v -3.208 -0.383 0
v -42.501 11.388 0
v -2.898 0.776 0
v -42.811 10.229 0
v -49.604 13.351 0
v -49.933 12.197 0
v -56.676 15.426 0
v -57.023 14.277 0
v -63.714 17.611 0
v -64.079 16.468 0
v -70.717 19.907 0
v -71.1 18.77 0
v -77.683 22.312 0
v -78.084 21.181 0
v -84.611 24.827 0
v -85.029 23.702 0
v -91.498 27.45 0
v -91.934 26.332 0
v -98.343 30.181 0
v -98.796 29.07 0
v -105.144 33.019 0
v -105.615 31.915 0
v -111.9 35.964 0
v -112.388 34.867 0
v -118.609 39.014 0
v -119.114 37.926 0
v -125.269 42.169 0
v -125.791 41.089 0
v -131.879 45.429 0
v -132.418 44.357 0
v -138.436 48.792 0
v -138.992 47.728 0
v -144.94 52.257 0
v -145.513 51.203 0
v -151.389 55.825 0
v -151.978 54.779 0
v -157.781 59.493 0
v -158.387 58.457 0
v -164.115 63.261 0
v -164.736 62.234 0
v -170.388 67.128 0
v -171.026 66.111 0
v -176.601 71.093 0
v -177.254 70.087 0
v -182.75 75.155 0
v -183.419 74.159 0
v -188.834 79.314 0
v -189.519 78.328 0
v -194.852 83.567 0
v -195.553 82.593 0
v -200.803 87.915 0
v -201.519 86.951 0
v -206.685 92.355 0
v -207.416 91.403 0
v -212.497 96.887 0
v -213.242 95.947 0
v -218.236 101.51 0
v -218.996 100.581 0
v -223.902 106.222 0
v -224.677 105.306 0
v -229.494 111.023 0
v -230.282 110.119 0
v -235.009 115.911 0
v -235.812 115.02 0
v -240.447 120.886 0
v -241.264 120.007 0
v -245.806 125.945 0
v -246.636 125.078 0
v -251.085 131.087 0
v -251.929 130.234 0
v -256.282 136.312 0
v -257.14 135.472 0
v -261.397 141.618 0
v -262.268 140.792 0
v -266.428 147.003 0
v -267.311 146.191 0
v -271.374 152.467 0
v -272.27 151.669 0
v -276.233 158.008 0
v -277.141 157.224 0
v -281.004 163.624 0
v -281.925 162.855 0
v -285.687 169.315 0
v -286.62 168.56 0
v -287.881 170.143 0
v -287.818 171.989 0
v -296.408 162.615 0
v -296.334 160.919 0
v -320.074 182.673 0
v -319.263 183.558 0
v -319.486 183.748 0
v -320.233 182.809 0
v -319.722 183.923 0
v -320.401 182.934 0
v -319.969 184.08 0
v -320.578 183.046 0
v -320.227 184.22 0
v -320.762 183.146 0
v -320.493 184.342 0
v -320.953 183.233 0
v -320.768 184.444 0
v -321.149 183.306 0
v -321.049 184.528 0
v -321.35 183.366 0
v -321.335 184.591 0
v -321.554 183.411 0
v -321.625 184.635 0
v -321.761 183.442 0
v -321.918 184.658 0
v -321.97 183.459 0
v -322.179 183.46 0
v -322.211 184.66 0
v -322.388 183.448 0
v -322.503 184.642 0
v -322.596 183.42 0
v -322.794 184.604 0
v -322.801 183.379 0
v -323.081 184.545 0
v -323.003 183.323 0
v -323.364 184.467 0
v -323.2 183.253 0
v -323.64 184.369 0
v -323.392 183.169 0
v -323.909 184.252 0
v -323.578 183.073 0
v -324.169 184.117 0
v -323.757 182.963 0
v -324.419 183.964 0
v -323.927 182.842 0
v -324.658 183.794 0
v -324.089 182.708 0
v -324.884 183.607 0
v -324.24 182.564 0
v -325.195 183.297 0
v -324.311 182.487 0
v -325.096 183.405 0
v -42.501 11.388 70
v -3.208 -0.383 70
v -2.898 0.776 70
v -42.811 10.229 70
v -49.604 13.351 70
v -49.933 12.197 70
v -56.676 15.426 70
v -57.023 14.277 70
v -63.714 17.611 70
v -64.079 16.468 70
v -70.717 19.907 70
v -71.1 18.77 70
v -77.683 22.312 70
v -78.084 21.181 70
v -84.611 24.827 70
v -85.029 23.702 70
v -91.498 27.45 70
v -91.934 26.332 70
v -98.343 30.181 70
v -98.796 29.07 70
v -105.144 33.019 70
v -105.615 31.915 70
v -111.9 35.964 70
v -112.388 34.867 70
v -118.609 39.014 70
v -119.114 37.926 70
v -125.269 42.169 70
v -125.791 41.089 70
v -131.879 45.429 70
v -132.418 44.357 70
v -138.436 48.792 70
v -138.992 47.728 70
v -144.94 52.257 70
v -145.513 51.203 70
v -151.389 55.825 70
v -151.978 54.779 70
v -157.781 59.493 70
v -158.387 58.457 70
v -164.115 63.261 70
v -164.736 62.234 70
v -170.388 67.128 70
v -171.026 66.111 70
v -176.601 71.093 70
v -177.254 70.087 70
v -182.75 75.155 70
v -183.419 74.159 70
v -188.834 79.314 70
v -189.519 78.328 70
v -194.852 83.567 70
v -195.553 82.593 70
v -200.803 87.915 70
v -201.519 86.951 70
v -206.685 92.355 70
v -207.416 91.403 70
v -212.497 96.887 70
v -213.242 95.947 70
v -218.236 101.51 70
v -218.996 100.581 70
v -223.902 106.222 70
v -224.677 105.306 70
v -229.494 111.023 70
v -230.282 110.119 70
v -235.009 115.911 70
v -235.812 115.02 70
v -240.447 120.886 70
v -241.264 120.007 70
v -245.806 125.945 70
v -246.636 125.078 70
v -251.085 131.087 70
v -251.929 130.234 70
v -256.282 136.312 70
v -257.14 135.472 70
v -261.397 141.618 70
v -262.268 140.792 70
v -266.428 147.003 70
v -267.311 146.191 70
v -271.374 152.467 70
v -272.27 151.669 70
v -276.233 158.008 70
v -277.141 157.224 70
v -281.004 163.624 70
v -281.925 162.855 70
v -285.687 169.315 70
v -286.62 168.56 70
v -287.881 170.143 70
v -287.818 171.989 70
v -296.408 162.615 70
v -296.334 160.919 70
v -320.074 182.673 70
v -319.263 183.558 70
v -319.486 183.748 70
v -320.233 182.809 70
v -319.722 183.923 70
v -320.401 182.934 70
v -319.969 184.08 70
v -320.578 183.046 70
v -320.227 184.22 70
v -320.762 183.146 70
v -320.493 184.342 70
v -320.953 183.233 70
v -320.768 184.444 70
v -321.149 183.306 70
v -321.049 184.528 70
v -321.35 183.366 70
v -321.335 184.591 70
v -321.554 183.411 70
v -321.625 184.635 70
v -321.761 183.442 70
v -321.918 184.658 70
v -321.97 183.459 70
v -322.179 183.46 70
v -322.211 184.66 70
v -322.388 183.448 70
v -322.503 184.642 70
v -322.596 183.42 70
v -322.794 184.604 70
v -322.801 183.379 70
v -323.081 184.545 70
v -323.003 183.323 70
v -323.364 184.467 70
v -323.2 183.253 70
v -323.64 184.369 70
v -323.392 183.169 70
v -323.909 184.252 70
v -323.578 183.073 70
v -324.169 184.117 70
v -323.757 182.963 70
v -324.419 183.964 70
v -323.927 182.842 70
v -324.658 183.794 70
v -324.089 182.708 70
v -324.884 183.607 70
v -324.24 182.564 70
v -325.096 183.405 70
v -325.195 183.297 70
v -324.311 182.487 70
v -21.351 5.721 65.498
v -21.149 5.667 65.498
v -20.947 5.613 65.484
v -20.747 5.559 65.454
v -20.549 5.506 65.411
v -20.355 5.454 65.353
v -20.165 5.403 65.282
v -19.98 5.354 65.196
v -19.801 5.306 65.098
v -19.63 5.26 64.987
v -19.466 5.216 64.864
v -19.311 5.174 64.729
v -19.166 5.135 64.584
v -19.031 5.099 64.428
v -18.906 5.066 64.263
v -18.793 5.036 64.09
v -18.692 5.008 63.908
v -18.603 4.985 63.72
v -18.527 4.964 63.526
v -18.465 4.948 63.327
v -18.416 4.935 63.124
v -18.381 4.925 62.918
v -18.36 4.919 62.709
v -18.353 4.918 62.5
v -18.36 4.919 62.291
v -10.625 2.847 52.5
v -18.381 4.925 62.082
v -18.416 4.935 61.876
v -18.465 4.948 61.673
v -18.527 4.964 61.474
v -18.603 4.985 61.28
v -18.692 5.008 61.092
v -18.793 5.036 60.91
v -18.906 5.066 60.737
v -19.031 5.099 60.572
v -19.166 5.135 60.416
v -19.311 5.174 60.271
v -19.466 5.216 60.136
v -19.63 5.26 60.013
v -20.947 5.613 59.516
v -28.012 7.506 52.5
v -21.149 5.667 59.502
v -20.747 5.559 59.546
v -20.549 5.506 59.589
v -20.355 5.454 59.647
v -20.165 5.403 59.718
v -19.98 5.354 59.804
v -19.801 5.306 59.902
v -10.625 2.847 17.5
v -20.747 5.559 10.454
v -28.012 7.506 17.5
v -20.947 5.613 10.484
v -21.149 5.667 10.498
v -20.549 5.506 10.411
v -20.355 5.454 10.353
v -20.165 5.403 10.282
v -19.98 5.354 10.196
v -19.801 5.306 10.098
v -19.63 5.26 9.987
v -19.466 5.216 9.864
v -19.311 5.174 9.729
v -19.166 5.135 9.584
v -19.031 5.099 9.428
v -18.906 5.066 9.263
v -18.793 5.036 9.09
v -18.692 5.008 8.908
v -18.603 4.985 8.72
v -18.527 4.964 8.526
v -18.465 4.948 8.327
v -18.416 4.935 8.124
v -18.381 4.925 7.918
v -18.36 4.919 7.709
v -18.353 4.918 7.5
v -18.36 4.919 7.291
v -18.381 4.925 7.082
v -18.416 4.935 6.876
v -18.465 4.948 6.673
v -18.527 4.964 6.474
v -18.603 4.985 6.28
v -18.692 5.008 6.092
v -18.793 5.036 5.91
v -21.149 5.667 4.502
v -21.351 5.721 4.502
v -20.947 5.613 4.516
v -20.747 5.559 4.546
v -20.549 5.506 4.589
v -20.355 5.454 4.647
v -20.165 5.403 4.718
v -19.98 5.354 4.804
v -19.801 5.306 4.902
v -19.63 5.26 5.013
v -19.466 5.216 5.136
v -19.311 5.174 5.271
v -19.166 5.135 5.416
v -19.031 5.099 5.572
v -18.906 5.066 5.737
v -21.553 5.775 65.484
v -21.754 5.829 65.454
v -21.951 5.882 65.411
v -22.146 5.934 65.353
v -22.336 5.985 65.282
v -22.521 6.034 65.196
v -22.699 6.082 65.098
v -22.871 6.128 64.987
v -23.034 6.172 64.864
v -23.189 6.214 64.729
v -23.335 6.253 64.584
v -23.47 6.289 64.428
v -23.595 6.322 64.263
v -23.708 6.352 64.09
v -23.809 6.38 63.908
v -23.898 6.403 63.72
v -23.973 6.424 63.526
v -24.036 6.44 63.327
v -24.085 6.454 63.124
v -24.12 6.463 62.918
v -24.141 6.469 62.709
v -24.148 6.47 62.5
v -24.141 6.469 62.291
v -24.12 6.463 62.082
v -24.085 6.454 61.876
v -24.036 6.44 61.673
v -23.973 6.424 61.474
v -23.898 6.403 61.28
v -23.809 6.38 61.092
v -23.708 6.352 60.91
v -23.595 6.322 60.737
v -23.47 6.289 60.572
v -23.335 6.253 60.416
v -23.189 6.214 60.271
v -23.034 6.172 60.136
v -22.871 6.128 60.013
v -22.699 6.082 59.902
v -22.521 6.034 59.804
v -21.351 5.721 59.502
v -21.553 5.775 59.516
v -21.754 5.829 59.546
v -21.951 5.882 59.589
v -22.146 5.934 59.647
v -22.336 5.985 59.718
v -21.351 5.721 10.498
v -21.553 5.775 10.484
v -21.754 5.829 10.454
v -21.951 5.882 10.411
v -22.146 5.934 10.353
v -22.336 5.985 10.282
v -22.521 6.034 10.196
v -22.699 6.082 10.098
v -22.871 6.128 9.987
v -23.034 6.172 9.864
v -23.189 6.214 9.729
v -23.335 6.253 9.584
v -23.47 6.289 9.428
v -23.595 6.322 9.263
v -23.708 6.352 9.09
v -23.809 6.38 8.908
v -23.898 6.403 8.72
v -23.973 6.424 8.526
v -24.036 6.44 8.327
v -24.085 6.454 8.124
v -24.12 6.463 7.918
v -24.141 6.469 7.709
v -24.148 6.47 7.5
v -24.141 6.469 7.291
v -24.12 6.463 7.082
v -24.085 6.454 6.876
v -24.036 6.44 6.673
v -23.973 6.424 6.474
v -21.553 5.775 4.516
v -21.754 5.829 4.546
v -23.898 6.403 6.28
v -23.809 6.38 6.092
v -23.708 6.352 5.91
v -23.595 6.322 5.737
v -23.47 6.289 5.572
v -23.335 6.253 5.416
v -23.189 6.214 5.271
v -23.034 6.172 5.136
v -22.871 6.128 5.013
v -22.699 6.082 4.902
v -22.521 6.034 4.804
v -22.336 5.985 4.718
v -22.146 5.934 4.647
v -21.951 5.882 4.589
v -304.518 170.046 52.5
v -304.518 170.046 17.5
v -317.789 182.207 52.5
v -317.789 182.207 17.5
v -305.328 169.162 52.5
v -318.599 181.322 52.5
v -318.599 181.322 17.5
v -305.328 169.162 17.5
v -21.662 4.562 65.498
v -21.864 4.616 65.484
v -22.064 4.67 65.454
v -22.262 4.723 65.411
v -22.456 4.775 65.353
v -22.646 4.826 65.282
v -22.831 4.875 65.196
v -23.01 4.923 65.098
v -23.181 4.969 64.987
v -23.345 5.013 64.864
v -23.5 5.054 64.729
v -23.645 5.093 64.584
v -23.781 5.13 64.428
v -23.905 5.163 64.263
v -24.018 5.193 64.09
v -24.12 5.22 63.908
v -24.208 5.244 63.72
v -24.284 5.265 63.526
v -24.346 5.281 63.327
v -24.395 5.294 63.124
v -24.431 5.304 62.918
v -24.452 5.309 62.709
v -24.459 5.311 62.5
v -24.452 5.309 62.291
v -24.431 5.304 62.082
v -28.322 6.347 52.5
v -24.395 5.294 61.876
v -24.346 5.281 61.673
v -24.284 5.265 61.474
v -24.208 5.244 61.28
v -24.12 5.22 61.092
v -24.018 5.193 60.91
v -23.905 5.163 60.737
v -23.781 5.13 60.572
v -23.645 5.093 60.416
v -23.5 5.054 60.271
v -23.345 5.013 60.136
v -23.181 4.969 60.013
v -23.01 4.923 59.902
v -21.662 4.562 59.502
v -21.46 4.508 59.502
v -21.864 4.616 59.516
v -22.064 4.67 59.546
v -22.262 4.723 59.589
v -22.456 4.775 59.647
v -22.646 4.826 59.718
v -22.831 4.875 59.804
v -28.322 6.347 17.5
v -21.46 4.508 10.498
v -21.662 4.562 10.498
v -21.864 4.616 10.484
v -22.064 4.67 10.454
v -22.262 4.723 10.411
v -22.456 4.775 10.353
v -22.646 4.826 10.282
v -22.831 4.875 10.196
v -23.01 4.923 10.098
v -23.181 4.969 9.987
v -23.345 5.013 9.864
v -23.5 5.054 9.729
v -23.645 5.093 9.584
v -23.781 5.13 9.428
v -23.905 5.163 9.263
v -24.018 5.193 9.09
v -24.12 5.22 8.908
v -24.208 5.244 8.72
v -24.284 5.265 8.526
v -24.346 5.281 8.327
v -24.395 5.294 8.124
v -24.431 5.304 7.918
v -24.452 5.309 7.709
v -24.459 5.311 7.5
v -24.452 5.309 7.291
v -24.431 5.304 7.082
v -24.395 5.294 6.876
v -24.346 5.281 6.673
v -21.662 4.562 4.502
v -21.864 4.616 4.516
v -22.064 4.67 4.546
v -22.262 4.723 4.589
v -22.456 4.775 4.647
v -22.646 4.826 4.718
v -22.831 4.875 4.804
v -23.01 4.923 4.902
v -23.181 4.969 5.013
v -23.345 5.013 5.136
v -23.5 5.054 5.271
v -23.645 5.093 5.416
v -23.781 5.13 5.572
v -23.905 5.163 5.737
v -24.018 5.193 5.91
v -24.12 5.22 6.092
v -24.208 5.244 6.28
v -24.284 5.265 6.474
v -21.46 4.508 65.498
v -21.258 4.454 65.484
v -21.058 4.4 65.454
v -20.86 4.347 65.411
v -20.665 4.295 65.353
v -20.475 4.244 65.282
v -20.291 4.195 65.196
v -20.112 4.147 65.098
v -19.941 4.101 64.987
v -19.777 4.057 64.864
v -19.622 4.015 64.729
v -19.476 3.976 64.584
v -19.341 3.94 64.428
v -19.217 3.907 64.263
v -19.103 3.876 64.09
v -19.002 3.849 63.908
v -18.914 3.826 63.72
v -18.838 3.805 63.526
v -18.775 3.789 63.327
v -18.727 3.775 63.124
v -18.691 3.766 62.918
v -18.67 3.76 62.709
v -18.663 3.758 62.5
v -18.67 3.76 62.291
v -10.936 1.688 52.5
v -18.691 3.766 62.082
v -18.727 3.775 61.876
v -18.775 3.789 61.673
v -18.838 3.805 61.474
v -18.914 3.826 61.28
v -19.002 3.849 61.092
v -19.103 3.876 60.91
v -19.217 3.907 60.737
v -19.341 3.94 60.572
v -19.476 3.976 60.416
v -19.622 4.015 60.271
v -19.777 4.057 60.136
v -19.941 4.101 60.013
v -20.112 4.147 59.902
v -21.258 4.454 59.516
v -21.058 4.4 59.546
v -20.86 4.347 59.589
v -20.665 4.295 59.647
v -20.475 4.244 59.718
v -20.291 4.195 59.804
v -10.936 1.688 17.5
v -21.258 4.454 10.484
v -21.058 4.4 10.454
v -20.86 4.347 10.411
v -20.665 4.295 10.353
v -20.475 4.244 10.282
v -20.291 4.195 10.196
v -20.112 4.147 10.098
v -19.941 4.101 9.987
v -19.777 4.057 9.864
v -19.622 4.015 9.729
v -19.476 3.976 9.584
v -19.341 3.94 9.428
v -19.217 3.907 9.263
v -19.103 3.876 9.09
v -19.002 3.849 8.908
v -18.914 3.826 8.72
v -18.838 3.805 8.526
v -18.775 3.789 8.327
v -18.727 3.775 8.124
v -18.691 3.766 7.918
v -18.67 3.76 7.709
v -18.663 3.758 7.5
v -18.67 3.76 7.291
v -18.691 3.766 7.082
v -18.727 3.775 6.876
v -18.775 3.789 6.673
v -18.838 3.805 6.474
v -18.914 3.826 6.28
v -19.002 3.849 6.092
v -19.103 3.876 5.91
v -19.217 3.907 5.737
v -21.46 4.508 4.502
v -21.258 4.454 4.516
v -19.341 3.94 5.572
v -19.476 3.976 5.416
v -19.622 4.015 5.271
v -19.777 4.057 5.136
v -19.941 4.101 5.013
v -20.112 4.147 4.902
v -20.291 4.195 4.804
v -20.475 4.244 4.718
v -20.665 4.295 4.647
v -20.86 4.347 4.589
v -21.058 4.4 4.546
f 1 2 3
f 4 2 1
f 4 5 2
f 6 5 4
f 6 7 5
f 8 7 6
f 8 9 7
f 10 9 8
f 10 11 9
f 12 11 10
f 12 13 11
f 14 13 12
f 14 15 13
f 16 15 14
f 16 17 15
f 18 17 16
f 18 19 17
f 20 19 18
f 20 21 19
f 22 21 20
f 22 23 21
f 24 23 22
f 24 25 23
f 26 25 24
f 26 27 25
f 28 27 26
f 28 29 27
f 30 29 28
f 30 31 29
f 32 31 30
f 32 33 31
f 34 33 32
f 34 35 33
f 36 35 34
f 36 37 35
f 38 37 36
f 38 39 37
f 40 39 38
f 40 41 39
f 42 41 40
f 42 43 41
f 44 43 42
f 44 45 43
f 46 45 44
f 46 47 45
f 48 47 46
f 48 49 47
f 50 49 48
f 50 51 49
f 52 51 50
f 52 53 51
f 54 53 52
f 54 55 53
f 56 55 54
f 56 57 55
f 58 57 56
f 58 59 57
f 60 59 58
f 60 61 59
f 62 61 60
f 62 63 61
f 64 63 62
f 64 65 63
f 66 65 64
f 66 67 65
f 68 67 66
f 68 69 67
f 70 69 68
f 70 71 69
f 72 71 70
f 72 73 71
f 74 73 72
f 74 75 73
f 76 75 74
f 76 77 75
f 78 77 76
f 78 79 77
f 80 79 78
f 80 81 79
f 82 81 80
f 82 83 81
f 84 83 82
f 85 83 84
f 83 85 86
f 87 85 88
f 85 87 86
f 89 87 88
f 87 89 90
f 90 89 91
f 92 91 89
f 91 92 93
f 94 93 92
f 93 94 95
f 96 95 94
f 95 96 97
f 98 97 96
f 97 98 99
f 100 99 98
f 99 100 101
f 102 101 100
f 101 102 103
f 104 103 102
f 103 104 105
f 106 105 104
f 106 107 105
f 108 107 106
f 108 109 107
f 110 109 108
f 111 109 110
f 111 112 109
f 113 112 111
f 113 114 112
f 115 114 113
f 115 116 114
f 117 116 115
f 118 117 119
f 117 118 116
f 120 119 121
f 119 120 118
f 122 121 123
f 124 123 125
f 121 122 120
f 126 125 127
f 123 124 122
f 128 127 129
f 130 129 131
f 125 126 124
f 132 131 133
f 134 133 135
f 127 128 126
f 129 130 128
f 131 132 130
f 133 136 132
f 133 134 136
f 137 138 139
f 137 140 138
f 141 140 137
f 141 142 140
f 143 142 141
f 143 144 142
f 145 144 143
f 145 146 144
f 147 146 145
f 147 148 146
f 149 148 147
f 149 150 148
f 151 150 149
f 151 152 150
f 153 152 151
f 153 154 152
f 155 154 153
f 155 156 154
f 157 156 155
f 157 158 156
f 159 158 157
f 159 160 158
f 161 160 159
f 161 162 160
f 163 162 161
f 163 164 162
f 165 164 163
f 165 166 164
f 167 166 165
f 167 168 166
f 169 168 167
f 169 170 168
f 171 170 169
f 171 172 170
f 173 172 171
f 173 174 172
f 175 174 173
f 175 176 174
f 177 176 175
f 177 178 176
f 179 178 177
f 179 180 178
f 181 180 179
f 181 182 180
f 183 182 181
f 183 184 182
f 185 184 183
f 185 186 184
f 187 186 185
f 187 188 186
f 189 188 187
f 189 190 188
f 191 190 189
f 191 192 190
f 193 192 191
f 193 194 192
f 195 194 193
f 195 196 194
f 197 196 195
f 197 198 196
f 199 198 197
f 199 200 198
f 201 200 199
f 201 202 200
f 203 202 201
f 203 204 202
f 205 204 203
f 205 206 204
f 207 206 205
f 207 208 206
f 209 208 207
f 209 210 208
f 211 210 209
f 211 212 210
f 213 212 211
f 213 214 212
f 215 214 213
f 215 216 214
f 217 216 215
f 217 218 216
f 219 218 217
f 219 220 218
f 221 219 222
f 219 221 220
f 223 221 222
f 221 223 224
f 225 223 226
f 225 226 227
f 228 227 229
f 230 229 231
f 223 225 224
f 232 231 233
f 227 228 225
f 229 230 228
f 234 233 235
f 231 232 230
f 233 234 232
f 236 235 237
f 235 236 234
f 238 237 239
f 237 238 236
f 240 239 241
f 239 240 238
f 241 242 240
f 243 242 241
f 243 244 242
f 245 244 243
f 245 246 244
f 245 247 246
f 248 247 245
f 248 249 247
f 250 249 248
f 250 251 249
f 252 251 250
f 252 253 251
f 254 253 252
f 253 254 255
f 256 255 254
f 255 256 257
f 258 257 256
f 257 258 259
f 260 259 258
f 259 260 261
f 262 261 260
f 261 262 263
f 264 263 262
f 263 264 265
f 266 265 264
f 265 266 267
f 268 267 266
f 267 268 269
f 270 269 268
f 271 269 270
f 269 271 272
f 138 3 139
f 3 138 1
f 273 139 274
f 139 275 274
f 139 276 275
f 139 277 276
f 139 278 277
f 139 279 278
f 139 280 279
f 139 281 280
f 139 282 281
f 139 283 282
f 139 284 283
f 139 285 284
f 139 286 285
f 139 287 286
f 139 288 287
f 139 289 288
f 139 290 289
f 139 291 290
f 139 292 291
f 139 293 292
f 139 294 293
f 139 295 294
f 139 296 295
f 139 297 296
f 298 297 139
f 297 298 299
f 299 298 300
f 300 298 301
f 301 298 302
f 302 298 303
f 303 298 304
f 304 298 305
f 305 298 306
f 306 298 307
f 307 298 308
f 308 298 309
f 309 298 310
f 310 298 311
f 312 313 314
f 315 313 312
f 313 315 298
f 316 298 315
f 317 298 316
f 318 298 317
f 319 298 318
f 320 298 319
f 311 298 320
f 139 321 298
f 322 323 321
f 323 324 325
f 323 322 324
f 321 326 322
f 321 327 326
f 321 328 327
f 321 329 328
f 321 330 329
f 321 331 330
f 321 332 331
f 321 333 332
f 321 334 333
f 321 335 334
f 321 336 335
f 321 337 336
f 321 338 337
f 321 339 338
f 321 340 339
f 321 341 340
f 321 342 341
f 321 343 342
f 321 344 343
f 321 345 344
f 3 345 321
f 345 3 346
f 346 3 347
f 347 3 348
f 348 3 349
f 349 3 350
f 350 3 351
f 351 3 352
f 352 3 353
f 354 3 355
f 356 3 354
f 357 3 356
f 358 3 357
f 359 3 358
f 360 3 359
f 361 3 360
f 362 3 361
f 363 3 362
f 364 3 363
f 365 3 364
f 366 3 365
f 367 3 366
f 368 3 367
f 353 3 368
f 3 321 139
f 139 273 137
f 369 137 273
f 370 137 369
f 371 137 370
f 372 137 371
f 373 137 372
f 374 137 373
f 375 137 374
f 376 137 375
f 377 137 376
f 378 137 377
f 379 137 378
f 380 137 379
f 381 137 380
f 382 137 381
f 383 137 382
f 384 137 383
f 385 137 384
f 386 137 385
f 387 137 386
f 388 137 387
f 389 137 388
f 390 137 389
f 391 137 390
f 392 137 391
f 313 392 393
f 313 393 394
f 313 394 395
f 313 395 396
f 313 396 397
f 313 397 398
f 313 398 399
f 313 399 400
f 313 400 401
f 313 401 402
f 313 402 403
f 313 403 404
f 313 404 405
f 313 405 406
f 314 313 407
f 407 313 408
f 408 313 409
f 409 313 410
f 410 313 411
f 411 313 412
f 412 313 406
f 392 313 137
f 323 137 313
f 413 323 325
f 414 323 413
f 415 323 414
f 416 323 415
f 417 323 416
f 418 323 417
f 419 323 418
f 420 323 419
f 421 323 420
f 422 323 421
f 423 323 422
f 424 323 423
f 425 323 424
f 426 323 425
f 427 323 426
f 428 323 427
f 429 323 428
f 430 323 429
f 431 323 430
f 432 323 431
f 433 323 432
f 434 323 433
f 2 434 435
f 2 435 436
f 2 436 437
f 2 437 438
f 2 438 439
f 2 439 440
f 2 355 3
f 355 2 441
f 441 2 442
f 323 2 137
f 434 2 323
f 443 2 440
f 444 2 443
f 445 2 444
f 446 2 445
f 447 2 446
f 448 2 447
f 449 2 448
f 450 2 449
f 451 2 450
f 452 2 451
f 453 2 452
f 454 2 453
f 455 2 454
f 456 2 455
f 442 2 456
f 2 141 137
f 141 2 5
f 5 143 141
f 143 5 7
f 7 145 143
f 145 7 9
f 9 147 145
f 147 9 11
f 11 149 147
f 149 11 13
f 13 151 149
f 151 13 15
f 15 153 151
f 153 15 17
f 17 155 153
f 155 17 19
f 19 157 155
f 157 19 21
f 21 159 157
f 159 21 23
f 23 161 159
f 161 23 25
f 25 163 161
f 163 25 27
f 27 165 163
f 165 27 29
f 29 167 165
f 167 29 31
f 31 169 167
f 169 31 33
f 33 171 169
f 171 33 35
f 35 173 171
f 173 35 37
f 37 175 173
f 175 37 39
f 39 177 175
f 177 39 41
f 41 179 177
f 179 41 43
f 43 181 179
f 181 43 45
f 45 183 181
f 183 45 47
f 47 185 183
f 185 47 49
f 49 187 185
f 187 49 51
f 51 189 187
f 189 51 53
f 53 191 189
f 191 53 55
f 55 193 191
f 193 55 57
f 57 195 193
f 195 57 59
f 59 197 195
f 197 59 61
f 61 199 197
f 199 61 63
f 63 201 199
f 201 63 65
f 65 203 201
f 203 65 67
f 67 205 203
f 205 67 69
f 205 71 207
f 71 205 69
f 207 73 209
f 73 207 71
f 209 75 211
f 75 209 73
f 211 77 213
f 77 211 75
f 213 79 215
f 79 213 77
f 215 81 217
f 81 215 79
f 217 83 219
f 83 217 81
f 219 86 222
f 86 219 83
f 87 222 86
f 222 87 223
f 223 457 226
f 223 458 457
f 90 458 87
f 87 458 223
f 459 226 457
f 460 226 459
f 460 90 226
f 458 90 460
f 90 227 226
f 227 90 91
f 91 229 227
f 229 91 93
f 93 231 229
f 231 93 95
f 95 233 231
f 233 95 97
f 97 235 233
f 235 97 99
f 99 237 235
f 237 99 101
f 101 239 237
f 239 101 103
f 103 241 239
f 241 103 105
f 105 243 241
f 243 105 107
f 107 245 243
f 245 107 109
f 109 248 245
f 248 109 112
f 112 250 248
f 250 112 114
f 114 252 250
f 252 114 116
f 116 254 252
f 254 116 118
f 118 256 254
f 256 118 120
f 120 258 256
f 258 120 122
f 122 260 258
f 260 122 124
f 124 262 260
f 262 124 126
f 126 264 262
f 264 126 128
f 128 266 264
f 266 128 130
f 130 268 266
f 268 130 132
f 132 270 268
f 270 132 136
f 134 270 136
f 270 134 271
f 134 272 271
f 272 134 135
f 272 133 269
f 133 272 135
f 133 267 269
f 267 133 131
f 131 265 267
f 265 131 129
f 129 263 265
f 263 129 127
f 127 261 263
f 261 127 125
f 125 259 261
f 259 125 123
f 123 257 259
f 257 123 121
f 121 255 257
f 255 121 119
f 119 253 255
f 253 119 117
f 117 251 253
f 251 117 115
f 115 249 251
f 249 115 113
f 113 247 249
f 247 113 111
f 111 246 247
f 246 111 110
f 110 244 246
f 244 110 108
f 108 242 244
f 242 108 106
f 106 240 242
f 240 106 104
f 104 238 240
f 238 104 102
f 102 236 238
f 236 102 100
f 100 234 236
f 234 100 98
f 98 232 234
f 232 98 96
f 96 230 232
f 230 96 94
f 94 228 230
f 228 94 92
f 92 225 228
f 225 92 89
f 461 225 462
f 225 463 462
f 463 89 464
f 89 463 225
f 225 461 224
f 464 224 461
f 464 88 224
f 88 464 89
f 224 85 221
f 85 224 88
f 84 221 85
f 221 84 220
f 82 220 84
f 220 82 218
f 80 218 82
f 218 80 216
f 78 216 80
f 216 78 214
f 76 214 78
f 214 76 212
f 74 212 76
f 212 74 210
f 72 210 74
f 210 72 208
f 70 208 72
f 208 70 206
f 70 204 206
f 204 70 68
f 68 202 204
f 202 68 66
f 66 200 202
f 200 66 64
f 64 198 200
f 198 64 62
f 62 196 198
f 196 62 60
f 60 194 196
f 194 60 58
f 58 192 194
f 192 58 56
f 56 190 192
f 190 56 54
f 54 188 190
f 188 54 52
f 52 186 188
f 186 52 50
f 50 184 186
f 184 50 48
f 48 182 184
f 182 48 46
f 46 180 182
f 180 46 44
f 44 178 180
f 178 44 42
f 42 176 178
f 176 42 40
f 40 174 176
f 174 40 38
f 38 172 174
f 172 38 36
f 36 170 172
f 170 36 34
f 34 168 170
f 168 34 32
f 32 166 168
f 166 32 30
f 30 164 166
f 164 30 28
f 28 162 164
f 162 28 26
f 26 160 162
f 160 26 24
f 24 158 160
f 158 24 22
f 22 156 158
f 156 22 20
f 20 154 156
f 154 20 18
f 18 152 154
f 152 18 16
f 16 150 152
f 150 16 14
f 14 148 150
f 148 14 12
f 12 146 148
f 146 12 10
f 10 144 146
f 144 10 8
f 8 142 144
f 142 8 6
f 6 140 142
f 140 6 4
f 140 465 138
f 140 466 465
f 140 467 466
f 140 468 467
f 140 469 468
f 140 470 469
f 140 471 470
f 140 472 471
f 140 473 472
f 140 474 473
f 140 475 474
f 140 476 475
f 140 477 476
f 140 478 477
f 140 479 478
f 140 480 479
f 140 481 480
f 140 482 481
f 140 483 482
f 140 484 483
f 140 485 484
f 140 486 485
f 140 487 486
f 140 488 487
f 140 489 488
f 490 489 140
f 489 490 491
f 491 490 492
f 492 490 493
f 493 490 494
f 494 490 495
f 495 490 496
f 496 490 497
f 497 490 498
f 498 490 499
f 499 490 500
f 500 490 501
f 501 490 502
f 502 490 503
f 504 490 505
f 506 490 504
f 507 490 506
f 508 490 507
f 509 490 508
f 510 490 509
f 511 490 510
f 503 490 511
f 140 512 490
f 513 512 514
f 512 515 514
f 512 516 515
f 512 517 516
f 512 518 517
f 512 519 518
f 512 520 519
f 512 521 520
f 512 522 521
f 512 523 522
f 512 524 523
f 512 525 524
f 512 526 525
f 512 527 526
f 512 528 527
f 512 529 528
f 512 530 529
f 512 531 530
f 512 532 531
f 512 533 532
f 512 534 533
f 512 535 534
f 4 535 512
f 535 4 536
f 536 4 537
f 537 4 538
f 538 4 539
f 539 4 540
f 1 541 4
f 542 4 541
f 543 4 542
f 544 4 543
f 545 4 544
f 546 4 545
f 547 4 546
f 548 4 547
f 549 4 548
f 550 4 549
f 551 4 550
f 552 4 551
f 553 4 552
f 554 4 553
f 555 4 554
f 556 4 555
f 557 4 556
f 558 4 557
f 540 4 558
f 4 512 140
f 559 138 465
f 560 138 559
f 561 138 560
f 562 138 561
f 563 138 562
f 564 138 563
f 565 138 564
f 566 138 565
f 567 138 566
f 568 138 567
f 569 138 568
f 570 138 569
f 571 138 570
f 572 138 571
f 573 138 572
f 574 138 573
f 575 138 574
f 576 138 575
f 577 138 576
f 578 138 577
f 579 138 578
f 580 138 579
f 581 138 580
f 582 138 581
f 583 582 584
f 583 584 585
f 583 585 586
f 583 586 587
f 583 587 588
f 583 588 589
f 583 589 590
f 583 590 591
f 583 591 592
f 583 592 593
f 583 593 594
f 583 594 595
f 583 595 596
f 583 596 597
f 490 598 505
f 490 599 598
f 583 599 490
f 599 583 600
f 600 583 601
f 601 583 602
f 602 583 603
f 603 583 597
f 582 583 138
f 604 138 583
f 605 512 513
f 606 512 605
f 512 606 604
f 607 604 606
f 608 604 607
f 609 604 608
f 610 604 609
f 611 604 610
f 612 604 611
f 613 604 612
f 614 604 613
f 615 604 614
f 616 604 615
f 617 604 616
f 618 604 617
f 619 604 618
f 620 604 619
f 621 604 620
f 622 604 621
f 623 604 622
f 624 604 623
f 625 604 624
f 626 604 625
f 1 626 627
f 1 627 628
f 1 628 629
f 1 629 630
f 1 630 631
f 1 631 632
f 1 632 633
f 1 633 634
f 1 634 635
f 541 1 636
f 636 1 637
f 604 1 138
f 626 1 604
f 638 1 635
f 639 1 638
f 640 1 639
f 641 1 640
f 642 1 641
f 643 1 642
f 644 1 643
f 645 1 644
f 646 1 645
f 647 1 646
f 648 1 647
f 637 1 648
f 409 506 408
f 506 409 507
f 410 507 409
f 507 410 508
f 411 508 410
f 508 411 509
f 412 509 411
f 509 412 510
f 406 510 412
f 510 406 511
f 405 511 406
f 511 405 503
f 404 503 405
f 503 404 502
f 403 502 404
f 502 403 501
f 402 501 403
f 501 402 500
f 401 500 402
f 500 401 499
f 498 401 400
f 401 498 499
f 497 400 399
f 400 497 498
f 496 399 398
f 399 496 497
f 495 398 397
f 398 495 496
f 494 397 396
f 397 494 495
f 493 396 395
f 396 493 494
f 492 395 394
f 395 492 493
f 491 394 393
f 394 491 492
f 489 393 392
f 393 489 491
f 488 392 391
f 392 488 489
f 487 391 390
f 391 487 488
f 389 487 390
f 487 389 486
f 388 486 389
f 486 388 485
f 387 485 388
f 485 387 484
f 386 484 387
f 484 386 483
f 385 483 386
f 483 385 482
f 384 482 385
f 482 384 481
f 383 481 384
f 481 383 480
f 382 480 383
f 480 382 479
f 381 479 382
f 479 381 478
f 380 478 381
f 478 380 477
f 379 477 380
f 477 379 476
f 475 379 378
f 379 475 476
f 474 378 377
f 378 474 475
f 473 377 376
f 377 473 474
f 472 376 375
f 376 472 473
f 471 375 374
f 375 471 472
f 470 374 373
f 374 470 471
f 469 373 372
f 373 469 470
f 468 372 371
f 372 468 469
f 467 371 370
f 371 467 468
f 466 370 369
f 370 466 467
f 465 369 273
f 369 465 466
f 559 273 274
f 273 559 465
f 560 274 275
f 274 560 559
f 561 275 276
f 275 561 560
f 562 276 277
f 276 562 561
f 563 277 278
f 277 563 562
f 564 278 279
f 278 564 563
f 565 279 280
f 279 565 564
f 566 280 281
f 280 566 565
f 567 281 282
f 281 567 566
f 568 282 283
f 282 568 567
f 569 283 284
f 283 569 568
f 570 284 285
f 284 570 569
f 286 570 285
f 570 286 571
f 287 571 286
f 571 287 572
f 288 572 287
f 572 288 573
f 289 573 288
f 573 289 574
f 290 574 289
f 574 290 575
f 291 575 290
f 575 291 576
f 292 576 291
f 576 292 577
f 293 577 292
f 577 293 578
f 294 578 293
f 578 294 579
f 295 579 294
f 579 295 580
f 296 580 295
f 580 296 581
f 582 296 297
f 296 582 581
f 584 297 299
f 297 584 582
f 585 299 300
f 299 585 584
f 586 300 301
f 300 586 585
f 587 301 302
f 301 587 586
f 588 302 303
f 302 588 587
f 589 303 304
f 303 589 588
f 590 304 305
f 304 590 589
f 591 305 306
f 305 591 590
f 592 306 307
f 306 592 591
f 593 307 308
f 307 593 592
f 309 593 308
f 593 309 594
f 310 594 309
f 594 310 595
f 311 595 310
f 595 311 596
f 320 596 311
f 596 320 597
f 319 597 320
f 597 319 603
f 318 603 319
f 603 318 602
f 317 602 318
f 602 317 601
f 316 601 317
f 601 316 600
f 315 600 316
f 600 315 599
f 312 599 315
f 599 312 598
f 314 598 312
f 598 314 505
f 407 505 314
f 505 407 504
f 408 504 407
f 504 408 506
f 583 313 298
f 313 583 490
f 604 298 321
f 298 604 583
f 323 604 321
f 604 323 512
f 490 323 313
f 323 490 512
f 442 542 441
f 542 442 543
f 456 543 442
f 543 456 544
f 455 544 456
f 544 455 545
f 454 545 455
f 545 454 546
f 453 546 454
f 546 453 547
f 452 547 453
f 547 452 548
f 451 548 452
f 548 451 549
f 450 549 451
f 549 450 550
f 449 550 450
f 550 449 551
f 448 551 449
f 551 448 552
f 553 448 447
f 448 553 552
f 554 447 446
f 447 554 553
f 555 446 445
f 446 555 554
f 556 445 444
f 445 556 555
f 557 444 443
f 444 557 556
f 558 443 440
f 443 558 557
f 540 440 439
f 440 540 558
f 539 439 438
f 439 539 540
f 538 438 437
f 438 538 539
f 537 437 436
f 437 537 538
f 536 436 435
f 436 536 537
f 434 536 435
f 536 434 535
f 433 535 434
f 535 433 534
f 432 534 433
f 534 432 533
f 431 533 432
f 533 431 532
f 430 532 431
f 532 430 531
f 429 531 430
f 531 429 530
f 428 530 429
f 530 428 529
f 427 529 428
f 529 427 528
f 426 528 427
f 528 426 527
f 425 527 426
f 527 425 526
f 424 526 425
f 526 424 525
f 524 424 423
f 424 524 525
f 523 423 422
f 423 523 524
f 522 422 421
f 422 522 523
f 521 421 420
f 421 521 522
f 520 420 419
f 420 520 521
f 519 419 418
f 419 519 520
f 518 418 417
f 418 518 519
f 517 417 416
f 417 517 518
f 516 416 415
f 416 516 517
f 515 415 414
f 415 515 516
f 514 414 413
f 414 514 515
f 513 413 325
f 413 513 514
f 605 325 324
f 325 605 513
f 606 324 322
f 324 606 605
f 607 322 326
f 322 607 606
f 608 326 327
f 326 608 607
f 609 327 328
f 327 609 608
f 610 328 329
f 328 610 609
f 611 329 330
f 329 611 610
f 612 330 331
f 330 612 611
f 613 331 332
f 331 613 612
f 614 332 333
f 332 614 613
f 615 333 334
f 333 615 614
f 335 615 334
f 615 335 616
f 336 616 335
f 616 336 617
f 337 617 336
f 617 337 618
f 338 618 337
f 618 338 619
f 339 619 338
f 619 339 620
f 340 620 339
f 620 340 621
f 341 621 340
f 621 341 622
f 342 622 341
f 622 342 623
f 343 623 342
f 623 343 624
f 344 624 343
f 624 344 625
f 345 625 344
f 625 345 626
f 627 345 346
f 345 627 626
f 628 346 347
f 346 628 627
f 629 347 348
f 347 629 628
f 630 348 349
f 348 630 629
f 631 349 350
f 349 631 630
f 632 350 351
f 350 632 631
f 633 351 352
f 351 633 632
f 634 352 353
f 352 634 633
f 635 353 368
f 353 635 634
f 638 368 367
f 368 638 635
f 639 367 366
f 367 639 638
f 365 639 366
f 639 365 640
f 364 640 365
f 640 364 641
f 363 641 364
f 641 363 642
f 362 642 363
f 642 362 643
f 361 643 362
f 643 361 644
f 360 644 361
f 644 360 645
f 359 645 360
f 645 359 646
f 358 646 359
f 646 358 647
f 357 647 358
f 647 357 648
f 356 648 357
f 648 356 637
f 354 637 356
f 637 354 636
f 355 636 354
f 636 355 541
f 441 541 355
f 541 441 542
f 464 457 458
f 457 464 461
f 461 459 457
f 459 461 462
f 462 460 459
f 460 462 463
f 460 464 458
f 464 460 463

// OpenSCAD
// file: ../src/door_catch.scad
in=25.4;

// how thick is the door?
door_thick=44;


// how wide the door is; makes for cleaner angles
door_width=28*in;

// how far should the door be open?
// distance of gap will be echo'd
//open_angle=(sin($t*360)/2+0.5)*45;
open_angle=13;

// distance to edge, used to place hole
catch=15;

// size of catch hole
catch_x=18;
catch_y=35;

// size of screw holes
screw=6;

// space between screws
// screws are assumed to be centered in door_thick
screw_gap=55;

// space around screw holes if automatically calculating height
screw_wall=4;

// thickness of part
wall=1.2;

//height=screw_gap+screw+screw_wall*2;
height=70;

// size of Z shape that stops the door from closing
latch=in/2;

// extra curve at end of the part to make closing smoother
close_r=3;

// trim off ends to fit printer bed 
//trim_base=14;
trim_base=3;
trim_end=10;

// only used for drawing a preview door
door_h=height;
display_angle=open_angle;


$fn=90;

big_fn=400;

function segment_radius(height, chord) = (height/2)+(chord*chord)/(8*height);

// link to sketch
open_y=sin(open_angle)*door_width;
open_x=door_width-(cos(open_angle)*door_width);
opening=sqrt((pow(open_x,2)+pow((open_y-door_thick),2)));
echo(opening/in);
echo(opening);

// link to sketch
latch_x=door_width-(cos(open_angle)*(door_width-latch));
latch_y=(sin(open_angle)*(door_width-latch))-door_thick;
latch_hyp=sqrt(pow(latch_x,2)+pow(latch_y,2));
latch_angle=atan(latch_y/latch_x);
radius=segment_radius(latch_x,latch_y*2);

module door() {
    translate([door_width,0])
    mirror([1,0,0])
    rotate([0,0,display_angle])
    color("tan")
    cube([door_width,door_thick,door_h]);
}

module profile() {
    translate([-wall,trim_base])
    square([wall,door_thick-trim_base]);
    translate([radius,door_thick])
    difference() {
        circle(r=radius+wall,$fn=big_fn);
        circle(r=radius,$fn=big_fn);

        // cut off botttom 
        translate([-radius-wall,-radius-wall*2])
        square([radius*2+wall*2,radius+wall*2]);

        // top right
        square([radius+wall*2,radius+wall*2]);

        // door
        translate([door_width-radius,-door_thick])
        mirror([1,0,0])
        rotate([0,0,display_angle])
        square([door_width,radius]);
    }
    translate([door_width,0])
    rotate([0,0,-open_angle]) 
    translate([-door_width,0]) {
        translate([-wall,-wall])
        square([latch,wall]);
        translate([-wall,-wall])
        square([wall,door_thick+wall-close_r-trim_end]);
        translate([-wall-close_r,door_thick-close_r-trim_end])
        difference() {
            intersection() {
                circle(r=close_r+wall);
                square([close_r+wall,close_r+wall]);
            }
            circle(r=close_r);
        }
    }
}

module dirror_y() {
    children();
    mirror([0,1])
    children();
}

module catch() {
    translate([door_thick/2-catch_x/2-catch,0])
    square([catch_x,catch_y],center=true);
    children();
}

module screws() {
    dirror_y()
    translate([0,screw_gap/2])
    circle(d=screw);
}

module place_catch(angle=0) {
    translate([door_width,0])
    rotate([0,0,-angle])
    translate([-door_width-wall*2,door_thick/2,height/2])
    rotate([90,0,90])
    linear_extrude(height=wall*3)
    children();
}

module latch() {
    difference() {
        linear_extrude(height=height)
        profile();
        place_catch()
        // uncomment this to allow the door to close
        catch()
        screws();
        place_catch(open_angle)
        catch();
    }
}
// main file
include <../src/door_catch.scad>;

open_angle=(sin($t*360)/2+0.5)*45+5;
display_angle=open_angle;

// RENDER gif 
module demo() {
    //door();
    rotate([0,0,75])
    latch();
}

demo();
